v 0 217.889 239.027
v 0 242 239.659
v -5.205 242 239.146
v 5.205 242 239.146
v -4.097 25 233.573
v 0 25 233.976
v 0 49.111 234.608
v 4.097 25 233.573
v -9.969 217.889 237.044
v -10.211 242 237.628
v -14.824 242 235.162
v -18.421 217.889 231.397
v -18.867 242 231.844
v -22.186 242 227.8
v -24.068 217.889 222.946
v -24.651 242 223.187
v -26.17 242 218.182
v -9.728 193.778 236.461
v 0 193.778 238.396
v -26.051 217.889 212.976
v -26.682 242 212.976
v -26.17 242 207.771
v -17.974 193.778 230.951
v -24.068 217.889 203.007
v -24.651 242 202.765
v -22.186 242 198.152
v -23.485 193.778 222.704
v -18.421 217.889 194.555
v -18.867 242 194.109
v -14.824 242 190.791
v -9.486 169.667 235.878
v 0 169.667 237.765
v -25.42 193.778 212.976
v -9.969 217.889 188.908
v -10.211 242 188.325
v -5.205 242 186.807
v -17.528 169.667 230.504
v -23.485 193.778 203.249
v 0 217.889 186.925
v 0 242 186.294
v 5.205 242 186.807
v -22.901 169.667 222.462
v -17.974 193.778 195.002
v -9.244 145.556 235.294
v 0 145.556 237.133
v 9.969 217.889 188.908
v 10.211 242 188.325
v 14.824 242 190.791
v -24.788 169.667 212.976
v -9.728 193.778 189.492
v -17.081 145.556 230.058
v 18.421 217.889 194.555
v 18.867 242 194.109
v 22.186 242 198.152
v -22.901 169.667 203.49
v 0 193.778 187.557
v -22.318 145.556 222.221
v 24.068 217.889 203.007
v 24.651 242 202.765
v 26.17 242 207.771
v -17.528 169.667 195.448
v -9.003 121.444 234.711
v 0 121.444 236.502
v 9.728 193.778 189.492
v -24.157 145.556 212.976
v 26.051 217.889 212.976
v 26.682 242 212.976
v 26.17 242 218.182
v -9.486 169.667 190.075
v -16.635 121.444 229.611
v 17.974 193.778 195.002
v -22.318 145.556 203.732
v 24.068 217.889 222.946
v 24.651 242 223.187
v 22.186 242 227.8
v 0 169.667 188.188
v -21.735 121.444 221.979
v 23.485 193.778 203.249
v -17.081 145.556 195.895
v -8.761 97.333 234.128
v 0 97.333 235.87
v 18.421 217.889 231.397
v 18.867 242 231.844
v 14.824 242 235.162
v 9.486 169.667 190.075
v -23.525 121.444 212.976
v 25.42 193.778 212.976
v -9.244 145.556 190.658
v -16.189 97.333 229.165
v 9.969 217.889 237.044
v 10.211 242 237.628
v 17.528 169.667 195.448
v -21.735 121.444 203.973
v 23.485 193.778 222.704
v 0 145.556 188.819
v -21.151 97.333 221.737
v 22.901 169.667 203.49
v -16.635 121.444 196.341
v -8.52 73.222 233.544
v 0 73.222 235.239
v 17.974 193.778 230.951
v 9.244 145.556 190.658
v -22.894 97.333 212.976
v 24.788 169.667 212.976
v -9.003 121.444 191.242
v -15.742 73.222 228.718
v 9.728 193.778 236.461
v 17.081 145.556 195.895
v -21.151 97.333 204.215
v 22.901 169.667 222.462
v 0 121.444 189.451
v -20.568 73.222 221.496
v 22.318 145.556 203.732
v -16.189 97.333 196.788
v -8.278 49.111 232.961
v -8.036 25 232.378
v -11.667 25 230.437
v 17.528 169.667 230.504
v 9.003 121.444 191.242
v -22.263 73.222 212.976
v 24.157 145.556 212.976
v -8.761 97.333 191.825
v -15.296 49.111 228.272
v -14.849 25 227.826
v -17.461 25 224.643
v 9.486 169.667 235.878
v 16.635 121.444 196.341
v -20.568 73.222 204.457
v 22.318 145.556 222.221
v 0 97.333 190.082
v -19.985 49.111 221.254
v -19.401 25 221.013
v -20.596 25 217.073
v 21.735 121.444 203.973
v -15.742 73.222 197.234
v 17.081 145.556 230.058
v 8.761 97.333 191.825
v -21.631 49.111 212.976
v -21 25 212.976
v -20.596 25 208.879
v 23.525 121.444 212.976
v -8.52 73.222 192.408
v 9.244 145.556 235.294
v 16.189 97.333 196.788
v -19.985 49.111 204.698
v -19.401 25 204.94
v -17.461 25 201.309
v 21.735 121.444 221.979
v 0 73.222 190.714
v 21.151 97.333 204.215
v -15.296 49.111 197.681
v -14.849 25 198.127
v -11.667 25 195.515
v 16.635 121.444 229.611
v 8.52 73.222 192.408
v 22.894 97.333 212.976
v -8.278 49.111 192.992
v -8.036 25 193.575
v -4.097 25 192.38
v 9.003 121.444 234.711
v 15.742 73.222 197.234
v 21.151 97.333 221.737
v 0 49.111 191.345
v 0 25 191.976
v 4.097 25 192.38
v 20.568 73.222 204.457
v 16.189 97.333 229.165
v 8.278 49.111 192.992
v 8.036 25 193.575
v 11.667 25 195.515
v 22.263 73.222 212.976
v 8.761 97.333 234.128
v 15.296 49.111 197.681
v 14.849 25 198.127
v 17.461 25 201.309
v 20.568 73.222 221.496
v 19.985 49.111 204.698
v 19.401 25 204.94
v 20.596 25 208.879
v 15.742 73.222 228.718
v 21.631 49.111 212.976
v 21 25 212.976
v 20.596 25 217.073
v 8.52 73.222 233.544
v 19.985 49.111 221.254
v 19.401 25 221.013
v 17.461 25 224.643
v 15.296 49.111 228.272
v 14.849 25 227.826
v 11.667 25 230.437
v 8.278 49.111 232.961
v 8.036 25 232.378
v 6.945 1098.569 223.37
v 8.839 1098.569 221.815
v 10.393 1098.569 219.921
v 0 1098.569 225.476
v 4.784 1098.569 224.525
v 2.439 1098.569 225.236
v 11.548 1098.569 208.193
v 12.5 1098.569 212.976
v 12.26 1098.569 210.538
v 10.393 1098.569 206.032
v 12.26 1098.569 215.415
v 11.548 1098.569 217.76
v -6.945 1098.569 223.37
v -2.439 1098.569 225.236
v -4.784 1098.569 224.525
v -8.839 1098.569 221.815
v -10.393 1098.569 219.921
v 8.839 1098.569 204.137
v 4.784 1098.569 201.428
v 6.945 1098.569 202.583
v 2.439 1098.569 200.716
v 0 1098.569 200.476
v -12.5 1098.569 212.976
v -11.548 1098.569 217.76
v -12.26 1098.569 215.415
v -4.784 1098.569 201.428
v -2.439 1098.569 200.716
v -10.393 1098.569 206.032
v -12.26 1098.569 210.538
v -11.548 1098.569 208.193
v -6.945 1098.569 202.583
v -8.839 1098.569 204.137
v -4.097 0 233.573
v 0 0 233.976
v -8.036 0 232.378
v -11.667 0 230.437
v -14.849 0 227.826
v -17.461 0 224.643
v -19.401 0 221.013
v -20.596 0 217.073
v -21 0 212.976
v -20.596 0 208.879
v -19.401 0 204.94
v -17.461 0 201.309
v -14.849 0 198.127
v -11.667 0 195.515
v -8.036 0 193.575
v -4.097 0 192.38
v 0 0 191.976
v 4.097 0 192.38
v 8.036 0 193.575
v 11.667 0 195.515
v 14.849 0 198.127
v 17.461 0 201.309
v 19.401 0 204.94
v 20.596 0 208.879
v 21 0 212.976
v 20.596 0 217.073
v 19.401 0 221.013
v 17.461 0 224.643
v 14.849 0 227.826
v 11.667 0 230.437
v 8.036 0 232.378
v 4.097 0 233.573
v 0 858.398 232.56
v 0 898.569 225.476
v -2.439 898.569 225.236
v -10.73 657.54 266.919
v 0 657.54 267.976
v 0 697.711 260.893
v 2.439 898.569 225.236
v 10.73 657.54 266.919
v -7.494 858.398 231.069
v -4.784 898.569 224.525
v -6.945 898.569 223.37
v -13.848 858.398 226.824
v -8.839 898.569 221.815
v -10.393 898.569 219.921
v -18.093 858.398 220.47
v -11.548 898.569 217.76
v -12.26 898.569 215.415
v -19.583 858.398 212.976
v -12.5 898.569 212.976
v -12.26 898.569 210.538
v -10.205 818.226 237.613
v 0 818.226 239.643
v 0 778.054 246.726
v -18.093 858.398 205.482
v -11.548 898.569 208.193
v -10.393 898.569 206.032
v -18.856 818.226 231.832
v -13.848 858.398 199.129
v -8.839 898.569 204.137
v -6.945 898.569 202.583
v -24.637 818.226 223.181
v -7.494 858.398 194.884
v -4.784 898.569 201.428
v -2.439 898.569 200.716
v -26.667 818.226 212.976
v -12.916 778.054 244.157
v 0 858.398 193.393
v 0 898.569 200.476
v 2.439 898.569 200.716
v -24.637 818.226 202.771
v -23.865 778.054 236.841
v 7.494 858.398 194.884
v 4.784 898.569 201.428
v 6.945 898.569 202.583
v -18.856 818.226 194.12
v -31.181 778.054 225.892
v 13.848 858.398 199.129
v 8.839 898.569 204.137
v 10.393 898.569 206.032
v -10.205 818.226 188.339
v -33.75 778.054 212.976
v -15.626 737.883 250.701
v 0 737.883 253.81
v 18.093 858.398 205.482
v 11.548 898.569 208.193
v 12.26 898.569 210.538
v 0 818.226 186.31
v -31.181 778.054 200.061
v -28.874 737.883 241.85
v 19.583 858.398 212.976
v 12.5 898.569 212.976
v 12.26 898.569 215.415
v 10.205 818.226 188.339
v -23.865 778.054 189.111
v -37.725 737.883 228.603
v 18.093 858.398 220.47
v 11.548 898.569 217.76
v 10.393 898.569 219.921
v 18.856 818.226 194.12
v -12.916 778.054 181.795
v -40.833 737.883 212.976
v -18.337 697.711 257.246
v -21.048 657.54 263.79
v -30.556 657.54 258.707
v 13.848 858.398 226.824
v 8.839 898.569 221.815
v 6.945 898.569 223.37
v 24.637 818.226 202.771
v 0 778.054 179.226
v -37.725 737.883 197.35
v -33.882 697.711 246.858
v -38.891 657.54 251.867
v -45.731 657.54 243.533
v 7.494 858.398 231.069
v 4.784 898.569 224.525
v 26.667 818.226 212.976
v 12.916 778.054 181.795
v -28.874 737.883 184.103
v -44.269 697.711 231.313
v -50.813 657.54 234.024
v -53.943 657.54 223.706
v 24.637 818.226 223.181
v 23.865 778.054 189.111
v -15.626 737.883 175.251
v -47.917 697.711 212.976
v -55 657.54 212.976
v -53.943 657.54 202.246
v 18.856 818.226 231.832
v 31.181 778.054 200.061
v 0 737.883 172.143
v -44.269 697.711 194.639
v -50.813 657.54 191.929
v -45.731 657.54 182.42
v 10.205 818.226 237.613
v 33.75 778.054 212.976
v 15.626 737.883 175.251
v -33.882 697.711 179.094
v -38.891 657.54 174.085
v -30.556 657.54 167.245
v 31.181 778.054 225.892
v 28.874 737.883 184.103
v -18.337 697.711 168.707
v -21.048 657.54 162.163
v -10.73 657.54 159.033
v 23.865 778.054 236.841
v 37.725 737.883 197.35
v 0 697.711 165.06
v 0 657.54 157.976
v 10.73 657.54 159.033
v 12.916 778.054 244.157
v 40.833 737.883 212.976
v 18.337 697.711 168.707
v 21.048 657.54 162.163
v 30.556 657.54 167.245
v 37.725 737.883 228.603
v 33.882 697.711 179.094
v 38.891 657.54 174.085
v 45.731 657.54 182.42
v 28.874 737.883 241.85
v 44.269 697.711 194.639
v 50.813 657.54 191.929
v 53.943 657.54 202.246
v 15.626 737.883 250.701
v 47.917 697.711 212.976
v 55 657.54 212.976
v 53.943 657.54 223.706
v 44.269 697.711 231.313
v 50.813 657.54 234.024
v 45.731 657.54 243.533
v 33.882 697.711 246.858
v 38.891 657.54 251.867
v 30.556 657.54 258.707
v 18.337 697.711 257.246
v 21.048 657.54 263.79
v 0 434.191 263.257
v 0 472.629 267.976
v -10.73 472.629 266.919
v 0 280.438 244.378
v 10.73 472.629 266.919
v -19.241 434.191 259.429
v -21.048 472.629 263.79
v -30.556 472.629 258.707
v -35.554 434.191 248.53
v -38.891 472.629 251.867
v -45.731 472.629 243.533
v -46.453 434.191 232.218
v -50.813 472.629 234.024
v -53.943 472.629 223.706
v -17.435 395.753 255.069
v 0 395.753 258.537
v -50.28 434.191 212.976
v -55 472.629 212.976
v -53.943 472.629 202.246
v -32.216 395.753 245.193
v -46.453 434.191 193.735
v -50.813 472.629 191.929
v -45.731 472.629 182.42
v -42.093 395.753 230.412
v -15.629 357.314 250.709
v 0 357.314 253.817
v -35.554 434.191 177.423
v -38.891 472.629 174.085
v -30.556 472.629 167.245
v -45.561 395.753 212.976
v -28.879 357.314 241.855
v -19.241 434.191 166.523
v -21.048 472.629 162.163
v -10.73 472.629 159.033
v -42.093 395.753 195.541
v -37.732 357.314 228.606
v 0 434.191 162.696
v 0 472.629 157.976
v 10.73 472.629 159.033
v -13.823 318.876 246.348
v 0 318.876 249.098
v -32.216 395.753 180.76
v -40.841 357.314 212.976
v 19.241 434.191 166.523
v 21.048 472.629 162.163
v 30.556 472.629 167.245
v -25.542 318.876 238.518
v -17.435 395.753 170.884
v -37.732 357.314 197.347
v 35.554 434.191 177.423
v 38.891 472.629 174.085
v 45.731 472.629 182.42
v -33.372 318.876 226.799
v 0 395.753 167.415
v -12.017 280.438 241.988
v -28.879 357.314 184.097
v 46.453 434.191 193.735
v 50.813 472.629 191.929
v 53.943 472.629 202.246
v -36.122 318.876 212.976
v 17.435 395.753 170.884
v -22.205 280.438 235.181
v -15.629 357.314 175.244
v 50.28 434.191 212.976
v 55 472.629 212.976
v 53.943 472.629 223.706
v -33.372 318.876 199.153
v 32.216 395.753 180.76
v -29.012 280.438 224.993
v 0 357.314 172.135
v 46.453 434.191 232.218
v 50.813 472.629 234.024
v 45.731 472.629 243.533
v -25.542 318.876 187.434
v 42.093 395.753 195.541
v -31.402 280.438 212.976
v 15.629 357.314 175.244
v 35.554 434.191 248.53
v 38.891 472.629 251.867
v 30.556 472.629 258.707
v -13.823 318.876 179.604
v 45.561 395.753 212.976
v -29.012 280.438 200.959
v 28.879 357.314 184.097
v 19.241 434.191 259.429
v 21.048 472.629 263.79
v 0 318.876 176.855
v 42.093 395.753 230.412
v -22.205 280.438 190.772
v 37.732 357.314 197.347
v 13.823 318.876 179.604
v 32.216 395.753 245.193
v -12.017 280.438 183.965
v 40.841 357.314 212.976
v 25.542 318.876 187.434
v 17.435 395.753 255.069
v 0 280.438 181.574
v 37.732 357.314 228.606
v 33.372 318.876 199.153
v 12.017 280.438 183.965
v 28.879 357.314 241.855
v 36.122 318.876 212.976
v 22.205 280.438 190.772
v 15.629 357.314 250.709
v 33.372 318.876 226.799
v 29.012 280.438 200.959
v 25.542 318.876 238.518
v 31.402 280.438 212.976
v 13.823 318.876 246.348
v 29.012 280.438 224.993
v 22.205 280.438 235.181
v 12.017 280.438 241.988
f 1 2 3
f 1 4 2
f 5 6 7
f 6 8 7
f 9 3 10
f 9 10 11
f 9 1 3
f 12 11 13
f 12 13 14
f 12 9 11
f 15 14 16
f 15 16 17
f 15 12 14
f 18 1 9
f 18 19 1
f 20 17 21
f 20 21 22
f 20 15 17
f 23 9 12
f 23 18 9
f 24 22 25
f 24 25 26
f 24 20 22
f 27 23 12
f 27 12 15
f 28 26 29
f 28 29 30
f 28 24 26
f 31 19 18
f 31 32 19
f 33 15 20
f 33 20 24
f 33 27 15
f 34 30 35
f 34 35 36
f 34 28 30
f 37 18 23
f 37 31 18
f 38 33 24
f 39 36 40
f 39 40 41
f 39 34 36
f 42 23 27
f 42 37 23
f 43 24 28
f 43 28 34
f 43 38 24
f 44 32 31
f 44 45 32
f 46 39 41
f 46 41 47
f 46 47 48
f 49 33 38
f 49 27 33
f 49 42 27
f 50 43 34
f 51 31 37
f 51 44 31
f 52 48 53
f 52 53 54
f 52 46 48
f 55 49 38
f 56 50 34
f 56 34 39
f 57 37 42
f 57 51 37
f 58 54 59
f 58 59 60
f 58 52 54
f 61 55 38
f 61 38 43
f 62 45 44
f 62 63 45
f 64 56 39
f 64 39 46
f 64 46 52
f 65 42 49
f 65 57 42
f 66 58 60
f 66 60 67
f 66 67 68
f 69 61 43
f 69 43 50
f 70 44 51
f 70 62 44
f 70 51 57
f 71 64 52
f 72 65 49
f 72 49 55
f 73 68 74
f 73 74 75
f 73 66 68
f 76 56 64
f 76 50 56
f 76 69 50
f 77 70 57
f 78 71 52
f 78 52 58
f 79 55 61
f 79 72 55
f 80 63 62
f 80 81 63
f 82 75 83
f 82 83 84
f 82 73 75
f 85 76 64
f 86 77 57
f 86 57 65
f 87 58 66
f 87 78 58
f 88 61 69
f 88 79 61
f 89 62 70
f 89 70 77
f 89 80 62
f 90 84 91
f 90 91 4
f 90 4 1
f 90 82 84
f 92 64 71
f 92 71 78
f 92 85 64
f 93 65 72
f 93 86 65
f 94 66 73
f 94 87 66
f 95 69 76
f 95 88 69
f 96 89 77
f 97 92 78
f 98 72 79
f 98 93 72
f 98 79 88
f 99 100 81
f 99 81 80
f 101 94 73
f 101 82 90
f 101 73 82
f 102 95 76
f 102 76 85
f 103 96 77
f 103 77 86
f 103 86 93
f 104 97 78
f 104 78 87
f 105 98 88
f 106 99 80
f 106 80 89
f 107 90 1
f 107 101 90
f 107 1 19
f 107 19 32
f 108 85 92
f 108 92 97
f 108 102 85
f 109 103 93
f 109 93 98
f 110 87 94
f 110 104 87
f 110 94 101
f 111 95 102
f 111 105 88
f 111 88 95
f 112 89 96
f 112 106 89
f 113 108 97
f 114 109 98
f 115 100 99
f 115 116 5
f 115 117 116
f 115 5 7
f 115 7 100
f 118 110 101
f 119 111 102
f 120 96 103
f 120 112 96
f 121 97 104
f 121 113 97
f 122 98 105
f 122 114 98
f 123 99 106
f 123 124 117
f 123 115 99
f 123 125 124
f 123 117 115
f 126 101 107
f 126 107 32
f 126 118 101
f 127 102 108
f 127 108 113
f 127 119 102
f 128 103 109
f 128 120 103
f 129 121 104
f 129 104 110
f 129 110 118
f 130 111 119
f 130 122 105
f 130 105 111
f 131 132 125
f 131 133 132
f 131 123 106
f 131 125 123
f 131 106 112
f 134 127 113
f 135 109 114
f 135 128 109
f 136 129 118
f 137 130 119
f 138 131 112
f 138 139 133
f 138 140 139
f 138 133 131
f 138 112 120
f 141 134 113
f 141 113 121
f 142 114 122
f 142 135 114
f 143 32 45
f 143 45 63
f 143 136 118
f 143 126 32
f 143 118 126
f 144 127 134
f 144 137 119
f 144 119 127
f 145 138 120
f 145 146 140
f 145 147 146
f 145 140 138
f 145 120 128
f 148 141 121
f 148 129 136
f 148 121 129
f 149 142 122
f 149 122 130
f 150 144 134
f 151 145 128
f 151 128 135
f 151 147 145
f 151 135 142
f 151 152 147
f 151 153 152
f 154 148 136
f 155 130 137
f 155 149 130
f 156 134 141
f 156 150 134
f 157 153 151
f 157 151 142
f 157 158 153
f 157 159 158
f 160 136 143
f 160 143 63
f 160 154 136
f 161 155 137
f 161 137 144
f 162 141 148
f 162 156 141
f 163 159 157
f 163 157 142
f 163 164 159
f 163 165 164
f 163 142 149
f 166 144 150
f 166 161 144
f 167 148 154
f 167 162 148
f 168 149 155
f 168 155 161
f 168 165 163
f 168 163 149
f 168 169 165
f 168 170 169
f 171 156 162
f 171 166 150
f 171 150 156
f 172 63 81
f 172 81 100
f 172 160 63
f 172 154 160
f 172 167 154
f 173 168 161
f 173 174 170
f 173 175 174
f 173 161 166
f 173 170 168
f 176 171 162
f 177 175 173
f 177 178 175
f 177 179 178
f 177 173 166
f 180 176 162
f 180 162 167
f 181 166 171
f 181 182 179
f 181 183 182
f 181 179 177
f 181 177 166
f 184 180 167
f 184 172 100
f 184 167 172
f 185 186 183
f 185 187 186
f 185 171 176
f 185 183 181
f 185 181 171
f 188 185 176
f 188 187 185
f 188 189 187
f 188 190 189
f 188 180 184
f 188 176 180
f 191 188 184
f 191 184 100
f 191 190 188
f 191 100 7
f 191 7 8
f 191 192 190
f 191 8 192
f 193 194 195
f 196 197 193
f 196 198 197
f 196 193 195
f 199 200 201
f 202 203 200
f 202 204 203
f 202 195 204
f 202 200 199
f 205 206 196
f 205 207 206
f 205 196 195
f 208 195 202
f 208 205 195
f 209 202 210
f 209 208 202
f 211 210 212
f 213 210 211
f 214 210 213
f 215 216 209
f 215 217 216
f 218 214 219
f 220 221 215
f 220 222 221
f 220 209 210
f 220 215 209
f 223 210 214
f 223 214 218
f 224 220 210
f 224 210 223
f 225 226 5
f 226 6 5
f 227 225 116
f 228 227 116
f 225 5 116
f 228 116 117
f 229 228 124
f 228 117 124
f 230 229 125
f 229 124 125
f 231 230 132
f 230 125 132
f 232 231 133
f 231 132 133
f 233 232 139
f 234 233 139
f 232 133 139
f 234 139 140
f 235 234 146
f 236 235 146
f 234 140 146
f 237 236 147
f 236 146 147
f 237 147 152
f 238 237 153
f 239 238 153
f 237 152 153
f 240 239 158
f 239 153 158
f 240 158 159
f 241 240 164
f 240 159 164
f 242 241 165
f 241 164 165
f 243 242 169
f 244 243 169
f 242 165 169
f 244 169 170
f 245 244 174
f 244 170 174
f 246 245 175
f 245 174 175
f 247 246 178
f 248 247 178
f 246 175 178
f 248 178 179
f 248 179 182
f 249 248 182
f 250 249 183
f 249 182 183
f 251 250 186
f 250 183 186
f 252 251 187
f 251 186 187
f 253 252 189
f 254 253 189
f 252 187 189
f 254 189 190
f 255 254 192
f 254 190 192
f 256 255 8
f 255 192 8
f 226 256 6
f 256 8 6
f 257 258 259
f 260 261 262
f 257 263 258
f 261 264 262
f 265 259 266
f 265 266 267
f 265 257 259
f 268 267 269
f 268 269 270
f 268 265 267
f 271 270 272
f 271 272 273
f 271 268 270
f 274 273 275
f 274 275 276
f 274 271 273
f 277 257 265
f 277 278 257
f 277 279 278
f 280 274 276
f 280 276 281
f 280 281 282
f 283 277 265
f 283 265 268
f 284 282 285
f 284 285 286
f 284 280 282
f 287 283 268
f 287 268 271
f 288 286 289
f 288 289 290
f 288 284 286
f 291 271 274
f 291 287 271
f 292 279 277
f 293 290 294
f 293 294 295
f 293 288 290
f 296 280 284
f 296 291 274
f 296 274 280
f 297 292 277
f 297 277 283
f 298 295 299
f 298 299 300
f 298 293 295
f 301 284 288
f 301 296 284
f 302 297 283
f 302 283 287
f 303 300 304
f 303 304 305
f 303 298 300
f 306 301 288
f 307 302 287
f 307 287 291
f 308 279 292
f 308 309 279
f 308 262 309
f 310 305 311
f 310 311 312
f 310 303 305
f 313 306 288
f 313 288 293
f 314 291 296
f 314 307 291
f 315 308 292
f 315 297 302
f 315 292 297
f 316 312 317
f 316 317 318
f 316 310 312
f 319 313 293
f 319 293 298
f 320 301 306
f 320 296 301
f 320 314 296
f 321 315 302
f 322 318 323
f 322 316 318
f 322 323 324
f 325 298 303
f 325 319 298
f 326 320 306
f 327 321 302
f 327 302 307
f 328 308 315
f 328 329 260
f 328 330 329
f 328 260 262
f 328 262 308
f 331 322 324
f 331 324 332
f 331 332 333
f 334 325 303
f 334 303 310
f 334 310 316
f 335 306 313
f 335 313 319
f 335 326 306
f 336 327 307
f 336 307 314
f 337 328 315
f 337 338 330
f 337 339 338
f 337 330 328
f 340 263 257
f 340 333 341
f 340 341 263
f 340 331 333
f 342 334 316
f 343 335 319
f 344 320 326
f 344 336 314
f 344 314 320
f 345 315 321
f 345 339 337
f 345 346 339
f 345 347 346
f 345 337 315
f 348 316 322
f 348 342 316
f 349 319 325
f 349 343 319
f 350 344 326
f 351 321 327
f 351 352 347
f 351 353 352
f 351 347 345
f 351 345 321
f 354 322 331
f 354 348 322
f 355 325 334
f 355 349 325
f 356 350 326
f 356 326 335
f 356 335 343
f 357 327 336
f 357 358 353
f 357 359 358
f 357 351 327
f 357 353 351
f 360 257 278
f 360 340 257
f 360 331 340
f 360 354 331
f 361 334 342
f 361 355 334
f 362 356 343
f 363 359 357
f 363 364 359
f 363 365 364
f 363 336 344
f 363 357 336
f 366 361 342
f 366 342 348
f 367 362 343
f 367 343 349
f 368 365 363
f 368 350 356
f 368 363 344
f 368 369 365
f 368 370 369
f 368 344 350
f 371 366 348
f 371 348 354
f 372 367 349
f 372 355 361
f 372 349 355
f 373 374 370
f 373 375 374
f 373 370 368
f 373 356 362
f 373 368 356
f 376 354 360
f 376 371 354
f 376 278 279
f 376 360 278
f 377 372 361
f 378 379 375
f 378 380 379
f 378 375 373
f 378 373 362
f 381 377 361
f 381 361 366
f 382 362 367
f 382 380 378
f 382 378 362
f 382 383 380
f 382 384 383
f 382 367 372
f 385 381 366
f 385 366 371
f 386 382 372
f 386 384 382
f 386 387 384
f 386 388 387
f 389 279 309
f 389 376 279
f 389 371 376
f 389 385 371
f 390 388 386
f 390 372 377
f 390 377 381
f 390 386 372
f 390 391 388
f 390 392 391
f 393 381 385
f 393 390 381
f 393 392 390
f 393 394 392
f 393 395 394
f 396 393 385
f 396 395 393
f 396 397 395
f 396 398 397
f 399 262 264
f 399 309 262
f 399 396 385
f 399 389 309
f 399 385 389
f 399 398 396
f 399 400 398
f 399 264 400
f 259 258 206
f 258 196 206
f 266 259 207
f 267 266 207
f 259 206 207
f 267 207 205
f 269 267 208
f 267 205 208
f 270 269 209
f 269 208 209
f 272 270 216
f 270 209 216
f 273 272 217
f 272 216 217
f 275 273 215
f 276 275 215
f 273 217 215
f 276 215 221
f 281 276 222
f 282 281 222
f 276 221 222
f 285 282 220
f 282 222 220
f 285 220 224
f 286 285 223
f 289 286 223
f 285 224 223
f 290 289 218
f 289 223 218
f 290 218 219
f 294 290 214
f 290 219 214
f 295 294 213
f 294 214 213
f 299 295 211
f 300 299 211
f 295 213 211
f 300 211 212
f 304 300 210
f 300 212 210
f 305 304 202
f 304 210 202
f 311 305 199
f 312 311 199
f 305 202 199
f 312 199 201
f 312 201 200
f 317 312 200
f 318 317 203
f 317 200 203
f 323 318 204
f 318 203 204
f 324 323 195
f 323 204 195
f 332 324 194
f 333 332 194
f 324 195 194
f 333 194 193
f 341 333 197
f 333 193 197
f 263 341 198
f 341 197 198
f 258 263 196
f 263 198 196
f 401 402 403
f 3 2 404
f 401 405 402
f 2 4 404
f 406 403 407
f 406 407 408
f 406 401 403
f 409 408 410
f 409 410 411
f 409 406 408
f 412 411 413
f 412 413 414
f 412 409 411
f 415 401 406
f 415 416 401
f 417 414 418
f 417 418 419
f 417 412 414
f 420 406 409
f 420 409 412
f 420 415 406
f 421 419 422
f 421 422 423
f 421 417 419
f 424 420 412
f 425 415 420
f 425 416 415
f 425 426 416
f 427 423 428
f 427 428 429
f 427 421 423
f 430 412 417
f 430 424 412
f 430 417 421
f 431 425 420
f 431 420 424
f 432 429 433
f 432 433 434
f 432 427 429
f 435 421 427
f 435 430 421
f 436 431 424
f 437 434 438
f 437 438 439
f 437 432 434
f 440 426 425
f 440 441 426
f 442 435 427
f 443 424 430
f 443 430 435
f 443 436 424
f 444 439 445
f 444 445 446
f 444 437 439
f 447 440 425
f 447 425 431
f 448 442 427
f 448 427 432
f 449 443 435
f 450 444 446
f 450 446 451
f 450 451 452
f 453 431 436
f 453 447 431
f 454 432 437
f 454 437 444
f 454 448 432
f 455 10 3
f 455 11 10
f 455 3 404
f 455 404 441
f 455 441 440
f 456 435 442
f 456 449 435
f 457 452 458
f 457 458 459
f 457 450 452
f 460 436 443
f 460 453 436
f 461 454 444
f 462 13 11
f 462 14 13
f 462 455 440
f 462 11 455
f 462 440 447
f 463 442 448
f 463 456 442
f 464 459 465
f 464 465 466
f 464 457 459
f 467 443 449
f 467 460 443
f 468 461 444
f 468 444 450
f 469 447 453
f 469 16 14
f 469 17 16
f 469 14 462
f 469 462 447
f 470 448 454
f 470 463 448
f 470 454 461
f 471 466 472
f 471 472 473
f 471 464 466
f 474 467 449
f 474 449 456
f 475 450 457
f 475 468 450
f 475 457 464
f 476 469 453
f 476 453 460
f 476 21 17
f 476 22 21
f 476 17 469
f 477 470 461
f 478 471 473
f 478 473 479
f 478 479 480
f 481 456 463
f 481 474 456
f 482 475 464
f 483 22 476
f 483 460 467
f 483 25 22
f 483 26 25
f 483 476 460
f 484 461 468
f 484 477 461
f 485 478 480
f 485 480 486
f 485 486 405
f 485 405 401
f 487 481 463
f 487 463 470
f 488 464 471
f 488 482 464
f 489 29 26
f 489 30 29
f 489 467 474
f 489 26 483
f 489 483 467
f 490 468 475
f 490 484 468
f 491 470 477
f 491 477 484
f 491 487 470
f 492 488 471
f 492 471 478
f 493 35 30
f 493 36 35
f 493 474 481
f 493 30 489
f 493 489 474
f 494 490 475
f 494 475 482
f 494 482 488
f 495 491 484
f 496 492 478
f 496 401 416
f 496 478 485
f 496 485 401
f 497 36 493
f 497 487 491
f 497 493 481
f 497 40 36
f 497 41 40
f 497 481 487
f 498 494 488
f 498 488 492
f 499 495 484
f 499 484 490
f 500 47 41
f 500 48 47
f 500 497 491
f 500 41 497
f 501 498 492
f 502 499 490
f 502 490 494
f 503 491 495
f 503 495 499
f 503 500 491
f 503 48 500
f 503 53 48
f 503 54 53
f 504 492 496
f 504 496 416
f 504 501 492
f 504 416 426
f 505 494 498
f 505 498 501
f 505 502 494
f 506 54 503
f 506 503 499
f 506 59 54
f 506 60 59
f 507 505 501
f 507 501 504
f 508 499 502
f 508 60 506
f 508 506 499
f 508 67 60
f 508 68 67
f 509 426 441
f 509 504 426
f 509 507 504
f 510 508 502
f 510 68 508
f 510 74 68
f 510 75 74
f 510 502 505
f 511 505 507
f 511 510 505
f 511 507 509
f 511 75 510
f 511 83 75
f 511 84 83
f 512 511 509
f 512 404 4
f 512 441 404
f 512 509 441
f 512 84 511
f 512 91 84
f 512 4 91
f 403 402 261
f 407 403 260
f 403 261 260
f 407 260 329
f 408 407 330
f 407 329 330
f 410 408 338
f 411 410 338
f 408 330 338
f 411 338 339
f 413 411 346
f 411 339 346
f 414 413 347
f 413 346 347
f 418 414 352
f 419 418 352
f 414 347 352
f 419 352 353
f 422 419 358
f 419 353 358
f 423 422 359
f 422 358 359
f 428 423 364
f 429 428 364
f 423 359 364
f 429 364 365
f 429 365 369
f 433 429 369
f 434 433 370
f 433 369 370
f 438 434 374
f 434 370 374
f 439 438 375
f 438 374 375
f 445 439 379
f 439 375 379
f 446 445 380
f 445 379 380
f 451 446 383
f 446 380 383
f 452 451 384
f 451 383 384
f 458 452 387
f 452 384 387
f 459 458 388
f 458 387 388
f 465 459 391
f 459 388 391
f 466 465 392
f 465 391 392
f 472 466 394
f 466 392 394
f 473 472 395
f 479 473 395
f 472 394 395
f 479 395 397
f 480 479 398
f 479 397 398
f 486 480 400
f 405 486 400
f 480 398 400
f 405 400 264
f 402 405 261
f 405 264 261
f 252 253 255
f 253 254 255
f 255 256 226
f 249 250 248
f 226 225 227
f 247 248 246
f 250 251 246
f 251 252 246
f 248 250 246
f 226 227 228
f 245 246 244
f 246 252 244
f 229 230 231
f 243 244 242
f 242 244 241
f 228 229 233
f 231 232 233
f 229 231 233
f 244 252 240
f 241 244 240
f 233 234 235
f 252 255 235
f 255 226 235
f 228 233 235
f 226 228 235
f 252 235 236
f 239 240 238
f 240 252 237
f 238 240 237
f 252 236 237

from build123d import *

# Parameters (mm, degrees)
F0_W   = 25
F0_H   = 21
F0_W_2 = 184.9109574539
F0_H_2 = 55
F0_W_3 = 200
F0_H_3 = 12.5


# Not quite as in the source:
# - the program builds the solid bodies; features that only make, move or delete a surface that nothing else refers to are left out


with BuildPart() as f1:
    # F0 (on Right) → F1 (revolve)
    with BuildSketch(Plane.YZ):
        with Locations((12.5, 223.4762815751)):
            Rectangle(F0_W, F0_H)
        Polygon((25, 233.9762815751), (25, 212.9762815751), (242, 212.9762815751), (242, 239.6586265556), align=None)
        Polygon((242, 239.6586265556), (242, 212.9762815751), (344.0616714118, 212.9762815751), (344.0616714118, 252.1902240649), align=None)
        Polygon((344.0616714118, 252.1902240649), (344.0616714118, 212.9762815751), (472.6287925066, 212.9762815751), (472.6287925066, 267.9762815751), align=None)
        with Locations((565.0842712335, 240.4762815751)):
            Rectangle(F0_W_2, F0_H_2)
        Polygon((657.5397499605, 267.9762815751), (657.5397499605, 212.9762815751), (813.5, 212.9762815751), (813.5, 240.4762815751), align=None)
        Polygon((813.5, 240.4762815751), (813.5, 212.9762815751), (898.5692272943, 212.9762815751), (898.5692272943, 225.4762815751), align=None)
        with Locations((998.5692272943, 219.2262815751)):
            Rectangle(F0_W_3, F0_H_3)
    revolve(axis=Axis((0, -32.5, 212.9762815751), (0, -1, 0)))


solid = f1.part
